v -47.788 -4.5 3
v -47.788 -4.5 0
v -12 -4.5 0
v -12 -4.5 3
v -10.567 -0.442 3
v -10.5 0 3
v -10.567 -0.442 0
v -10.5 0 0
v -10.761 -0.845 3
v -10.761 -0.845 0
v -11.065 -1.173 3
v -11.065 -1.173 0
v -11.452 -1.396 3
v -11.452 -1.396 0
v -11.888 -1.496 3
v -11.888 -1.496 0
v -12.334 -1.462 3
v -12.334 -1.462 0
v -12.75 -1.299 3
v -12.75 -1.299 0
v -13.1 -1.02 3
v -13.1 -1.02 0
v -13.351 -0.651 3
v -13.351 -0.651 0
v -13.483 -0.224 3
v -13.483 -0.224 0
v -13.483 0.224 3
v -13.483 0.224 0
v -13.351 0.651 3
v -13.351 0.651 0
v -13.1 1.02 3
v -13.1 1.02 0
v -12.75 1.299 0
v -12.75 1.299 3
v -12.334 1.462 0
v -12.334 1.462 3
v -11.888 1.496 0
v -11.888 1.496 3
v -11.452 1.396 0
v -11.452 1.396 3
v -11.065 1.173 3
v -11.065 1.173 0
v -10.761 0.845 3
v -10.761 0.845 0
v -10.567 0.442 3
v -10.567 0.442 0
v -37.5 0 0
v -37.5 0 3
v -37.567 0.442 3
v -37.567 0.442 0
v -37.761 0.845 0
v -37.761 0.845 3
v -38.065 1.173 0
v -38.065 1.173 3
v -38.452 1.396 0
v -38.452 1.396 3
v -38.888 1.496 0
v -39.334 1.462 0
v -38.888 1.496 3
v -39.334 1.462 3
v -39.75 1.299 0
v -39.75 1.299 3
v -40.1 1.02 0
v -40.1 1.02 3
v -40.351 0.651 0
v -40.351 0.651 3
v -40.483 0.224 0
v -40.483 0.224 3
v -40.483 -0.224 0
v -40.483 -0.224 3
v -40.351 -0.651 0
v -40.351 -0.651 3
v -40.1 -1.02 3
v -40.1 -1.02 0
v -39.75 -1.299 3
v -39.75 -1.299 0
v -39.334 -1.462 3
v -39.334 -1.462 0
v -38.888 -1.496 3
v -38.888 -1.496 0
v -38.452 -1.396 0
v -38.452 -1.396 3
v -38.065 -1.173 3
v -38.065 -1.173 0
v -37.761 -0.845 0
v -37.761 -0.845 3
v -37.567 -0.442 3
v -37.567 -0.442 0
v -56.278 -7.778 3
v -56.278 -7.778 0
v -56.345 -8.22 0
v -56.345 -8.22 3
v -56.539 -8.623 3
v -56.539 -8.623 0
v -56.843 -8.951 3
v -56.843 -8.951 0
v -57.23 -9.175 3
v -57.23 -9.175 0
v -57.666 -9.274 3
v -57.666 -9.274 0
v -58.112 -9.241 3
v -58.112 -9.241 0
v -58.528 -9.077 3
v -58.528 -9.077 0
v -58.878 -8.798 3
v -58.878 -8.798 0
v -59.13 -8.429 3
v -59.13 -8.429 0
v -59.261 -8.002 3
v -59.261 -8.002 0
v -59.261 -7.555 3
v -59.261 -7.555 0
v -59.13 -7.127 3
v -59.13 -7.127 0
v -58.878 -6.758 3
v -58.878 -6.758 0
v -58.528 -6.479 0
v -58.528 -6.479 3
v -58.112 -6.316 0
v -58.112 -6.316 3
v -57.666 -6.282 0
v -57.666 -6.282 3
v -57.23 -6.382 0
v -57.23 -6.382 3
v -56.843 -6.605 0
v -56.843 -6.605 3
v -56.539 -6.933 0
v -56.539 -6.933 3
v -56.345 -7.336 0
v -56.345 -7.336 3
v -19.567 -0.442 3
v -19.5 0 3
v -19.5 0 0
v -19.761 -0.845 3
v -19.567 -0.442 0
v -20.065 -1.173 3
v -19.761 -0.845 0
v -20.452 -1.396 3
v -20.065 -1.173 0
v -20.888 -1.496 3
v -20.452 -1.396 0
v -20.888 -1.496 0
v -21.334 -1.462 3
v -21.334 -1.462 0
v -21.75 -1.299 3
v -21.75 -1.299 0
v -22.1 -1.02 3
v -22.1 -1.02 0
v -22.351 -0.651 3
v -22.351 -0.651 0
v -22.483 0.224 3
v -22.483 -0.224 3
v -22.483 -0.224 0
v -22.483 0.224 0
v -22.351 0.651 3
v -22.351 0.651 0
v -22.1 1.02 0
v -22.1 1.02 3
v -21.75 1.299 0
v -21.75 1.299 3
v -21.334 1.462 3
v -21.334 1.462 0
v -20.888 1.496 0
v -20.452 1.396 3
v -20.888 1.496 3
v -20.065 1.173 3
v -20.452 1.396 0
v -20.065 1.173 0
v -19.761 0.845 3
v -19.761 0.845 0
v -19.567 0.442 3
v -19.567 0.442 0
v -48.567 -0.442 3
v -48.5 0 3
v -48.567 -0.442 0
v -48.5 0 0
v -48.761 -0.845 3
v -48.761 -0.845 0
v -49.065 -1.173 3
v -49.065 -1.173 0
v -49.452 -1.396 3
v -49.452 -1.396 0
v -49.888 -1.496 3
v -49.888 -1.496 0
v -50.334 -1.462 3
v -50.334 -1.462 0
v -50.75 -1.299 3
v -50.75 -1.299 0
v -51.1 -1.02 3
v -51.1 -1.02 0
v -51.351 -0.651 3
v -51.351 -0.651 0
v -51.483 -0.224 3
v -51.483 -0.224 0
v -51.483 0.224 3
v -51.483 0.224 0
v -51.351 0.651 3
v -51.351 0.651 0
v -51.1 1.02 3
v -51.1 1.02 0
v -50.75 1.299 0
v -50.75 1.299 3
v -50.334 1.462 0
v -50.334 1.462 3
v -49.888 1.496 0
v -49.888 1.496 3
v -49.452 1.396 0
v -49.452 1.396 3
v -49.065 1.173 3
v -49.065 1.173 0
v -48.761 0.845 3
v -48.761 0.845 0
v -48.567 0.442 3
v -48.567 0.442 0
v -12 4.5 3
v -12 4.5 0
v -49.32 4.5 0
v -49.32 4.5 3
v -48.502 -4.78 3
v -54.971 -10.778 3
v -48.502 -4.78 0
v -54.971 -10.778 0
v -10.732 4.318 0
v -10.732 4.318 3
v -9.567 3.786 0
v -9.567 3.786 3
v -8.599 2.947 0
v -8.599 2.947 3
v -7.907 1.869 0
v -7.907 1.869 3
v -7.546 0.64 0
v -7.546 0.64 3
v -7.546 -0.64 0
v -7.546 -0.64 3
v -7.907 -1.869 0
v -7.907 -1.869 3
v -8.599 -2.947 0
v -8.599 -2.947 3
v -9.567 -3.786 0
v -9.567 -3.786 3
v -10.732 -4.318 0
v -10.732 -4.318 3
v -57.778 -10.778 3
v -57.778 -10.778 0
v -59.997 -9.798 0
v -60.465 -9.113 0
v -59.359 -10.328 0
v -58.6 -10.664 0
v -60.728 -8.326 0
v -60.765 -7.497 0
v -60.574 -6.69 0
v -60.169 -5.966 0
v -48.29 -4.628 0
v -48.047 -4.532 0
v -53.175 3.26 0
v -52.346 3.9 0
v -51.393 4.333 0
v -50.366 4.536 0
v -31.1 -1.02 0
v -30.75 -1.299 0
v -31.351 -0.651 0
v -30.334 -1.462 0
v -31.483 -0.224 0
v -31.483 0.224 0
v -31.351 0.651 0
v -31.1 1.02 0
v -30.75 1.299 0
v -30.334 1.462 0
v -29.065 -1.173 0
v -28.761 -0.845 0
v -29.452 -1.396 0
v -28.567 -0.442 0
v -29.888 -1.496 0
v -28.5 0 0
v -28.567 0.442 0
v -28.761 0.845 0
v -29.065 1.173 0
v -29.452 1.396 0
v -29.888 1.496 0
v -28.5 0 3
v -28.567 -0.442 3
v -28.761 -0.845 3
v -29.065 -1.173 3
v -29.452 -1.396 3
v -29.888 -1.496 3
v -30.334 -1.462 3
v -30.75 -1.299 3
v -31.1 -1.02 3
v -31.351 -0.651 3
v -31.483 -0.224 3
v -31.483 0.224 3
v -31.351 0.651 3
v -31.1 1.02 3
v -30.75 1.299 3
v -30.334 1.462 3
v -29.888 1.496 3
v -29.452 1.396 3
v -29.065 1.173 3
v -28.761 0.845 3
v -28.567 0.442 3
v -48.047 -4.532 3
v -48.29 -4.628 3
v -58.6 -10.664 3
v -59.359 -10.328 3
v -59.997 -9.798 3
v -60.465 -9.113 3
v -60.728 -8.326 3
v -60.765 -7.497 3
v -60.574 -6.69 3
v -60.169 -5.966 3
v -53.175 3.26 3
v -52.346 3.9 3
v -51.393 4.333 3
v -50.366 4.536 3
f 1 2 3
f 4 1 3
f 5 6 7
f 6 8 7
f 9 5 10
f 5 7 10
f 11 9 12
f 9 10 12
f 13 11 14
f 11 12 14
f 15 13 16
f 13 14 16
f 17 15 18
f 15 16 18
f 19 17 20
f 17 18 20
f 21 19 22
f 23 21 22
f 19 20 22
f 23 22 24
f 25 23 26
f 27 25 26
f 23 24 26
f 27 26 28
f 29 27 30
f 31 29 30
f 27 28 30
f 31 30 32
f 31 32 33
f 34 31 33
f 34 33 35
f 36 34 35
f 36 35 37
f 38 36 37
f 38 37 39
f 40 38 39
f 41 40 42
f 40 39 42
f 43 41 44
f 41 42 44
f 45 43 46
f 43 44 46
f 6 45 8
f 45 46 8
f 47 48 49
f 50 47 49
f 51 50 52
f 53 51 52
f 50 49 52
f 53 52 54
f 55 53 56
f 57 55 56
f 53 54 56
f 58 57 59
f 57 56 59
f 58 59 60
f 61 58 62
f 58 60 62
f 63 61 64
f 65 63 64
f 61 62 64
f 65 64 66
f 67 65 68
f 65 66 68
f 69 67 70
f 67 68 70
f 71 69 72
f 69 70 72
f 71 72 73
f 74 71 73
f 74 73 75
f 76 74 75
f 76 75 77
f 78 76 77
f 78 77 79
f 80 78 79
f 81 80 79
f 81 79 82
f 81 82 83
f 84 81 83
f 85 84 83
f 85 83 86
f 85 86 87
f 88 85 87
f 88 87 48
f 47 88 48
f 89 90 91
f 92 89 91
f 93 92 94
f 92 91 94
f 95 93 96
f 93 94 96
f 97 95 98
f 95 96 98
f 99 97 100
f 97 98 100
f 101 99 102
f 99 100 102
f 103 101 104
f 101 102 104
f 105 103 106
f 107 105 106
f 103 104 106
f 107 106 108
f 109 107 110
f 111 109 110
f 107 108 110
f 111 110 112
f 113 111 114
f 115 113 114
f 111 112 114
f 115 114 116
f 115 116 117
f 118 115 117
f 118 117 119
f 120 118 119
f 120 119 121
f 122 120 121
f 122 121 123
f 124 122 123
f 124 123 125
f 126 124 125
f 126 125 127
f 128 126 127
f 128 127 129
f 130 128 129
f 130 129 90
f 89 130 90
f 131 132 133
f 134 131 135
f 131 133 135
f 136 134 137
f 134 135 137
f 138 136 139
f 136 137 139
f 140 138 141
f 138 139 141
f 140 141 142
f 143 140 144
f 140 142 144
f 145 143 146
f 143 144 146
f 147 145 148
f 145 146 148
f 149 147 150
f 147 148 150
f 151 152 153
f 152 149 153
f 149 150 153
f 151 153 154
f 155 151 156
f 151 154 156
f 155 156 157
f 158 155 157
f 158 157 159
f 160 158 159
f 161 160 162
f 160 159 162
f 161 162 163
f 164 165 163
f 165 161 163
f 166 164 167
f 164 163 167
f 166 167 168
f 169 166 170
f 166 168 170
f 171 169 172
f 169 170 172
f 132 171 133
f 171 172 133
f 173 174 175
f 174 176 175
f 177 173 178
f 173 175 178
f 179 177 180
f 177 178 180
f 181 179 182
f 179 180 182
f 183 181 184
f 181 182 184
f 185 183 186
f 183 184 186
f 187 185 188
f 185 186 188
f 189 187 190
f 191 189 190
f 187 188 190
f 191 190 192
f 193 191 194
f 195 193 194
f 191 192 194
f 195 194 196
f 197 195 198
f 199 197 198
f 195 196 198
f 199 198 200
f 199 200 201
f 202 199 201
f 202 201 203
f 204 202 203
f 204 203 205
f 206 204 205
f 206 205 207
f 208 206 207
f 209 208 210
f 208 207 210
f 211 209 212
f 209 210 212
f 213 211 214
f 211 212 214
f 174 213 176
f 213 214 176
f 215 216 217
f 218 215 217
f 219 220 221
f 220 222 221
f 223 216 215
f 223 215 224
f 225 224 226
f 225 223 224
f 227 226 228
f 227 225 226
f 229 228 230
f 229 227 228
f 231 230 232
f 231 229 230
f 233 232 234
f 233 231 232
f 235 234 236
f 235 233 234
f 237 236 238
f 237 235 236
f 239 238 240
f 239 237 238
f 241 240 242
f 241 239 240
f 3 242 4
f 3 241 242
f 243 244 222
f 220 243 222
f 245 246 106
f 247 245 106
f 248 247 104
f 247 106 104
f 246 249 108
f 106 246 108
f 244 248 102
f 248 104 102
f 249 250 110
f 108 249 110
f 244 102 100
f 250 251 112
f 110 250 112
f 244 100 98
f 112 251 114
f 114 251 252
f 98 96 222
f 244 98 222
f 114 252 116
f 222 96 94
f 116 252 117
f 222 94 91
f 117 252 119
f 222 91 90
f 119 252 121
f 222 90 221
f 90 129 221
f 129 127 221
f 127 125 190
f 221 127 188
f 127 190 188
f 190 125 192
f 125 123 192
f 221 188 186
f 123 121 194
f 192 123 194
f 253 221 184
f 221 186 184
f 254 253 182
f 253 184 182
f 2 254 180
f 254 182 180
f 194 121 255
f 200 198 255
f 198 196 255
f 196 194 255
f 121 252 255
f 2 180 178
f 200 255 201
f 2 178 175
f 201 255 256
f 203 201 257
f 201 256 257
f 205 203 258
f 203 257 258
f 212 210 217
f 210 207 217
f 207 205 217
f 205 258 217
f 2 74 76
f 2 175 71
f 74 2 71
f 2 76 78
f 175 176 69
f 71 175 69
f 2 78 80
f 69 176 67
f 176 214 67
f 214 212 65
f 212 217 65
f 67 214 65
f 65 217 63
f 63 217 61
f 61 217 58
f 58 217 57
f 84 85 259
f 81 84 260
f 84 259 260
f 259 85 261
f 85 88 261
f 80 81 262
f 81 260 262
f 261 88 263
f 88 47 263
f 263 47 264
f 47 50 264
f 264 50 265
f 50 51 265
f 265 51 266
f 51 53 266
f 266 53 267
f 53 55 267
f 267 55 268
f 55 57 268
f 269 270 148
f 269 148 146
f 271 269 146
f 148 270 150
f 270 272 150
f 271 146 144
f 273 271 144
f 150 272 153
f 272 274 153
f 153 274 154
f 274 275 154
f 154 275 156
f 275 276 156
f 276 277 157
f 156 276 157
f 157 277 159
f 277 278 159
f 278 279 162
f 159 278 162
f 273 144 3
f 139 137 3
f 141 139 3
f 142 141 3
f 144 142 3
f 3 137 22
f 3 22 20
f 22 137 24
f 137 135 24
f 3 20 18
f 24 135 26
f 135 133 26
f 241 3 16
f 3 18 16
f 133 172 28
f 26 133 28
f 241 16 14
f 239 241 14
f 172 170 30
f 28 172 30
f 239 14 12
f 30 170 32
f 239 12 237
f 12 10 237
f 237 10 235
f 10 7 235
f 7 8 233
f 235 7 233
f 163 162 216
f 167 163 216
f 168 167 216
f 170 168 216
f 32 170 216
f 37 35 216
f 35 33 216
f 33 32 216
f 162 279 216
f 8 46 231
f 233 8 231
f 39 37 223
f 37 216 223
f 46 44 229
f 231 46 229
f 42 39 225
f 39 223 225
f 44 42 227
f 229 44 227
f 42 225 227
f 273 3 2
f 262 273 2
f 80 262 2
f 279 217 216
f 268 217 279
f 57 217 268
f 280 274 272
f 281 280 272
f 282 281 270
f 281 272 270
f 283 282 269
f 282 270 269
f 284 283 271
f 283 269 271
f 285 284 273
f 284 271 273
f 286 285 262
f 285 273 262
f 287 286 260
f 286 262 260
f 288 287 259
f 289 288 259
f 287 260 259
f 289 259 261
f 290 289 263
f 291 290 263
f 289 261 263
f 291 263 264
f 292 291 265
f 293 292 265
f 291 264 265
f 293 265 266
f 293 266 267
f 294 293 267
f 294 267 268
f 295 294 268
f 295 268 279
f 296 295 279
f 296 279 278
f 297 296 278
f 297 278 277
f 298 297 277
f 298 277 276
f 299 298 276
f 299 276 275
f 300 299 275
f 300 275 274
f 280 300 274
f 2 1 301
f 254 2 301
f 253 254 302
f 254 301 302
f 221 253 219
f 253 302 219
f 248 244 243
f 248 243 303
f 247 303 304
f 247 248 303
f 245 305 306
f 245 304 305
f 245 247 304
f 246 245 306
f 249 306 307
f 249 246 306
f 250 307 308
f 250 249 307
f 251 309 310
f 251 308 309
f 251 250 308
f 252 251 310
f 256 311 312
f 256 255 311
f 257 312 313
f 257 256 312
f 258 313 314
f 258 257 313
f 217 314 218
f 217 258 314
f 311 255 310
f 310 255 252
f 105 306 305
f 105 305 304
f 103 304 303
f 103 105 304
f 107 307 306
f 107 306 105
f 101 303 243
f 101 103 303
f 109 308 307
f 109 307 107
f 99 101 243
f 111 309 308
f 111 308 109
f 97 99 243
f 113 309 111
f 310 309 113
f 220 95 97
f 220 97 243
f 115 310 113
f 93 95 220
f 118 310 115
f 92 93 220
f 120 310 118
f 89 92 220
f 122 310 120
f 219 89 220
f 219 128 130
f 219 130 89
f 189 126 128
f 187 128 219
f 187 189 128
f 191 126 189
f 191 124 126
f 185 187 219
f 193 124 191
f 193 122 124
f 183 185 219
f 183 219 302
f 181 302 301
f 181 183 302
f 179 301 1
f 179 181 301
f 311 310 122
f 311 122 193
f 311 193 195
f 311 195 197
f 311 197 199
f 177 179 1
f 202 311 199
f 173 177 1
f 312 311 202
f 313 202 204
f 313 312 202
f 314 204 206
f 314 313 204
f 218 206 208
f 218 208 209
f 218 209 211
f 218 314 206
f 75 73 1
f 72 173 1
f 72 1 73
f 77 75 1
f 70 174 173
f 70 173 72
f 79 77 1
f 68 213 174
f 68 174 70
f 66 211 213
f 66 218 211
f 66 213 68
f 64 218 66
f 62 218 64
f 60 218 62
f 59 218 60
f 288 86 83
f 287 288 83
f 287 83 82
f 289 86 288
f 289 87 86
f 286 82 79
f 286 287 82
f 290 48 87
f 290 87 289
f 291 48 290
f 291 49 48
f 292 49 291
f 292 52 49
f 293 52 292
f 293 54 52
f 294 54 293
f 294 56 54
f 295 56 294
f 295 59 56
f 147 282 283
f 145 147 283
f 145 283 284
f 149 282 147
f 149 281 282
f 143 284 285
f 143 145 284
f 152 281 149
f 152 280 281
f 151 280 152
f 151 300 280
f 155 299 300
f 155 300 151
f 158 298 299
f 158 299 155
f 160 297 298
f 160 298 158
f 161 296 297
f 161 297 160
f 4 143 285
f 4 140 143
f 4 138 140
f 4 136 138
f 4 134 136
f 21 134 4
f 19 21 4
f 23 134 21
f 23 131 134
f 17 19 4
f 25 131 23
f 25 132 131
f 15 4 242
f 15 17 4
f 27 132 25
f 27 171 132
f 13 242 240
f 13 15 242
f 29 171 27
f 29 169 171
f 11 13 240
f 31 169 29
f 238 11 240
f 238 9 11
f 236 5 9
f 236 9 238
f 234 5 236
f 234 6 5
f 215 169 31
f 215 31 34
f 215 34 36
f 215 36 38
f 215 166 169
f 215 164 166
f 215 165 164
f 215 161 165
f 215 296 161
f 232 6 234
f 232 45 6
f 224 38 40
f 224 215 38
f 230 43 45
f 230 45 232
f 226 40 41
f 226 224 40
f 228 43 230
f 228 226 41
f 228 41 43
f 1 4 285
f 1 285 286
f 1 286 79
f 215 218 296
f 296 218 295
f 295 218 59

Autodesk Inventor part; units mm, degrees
ref_plane "YZ Plane" through (0, 0, 0) normal (1, 0, 0) x (0, 1, 0)
ref_plane "XZ Plane" through (0, 0, 0) normal (0, 1, 0) x (-1, 0, 0)
ref_plane "XY Plane" through (0, 0, 0) normal (0, 0, 1) x (1, 0, 0)
sketch "スケッチ1" plane through (0, 0, 0) normal (0, 0, 1) x (1, 0, 0)
  circle A0 centre (-55, 0) radius 8.025 construction
  circle A1 centre (0, 0) radius 1.25 construction
  arc A2 (-44.5788, 6) -> (-63.6661, 8.3366) centre (-55, 0) ccw construction
  line L0 (-63.6661, 8.3366) -> (-109.1623, -38.9576) construction
  line L1 (-102.7709, -46.5745) -> (-48.2949, -9.9821) construction
  arc A3 (-48.2949, -9.9821) -> (-44.5788, -6) centre (-55, 0) ccw construction
  line L2 (-44.5788, -6) -> (-5.2915, -6) construction
  arc A4 (-5.2915, -6) -> (-5.2915, 6) centre (0, 0) ccw construction
  line L3 (-5.2915, 6) -> (-44.5788, 6) construction
  circle A5 centre (0, 0) radius 1.5
  circle A6 centre (-30, 0) radius 1.5
  circle A7 centre (-12, 0) radius 1.5
  circle A8 centre (-21, 0) radius 1.5
  line L4 (-30, 0) -> (0, 0)
  line L5 (-30, 0) -> (-50, 0)
  line L6 (-50, 0) -> (-30, 0)
  circle A9 centre (-50, 0) radius 1.5
  circle A10 centre (-50, 0) radius 4.025 construction
  circle A11 centre (-50, 0) radius 7.125 construction
  circle A12 centre (-57.7782, -7.7782) radius 1.5
  circle A13 centre (-57.7782, -7.7782) radius 3 construction
  line L7 (-50, 0) -> (-57.7782, -7.7782) construction
  line L8 (-53.1753, 3.2604) -> (-60.169, -5.9659)
  line L9 (-55.3874, -9.5904) -> (-46.209, 2.5181)
  arc A14 (-46.209, 2.5181) -> (-53.1753, 3.2604) centre (-50, 0) ccw
  arc A15 (-60.169, -5.9659) -> (-55.3874, -9.5904) centre (-57.7782, -7.7782) ccw
  line L10 (-50, 0) -> (0, 0) construction
  line L11 (-50, -4.5) -> (0, -4.5)
  line L12 (0, 4.5) -> (-50, 4.5)
  arc A16 (-50, 4.5) -> (-50, -4.5) centre (-50, 0) ccw
  arc A17 (0, -4.5) -> (0, 4.5) centre (0, 0) ccw
  line L13 (-57.7782, -10.7782) -> (-54.9706, -10.7782)
  line L14 (-54.9706, -10.7782) -> (-48.1997, -4.5)
  line L15 (-50, 0) -> (-57.7782, -7.7782)
  circle A18 centre (-12, 0) radius 4.5
  point P0 (-53.8891, -3.8891)
  point P1 (-25, 0)
  point P2 (-48.7574, -3)
  point P3 (-49.3198, 4.5)
  point P4 (-53.5862, 2.7184)
  point P5 (-51.3675, -4.2872)
  point P6 (-12, -4.5)
  point P7 (-12, 4.5)
  dimension "d25" = 3
  dimension "d26" = 0
  dimension "d0" = 20
  dimension "d2" = 3
  dimension "d3" = 8.05
  dimension "d4" = 3.1
  dimension "d5" = 30
  dimension "d6" = 3
  dimension "d7" = 3
  dimension "d8" = 3
  dimension "d9" = 3
  dimension "d11" = 9
  dimension "d13" = 3
  dimension "d14" = 6
  dimension "d15" = 6
  dimension "d16" = 9
  dimension "d21" = 135
  dimension "d22" = 10
  dimension "d30" = 9
  dimension "d31" = 11
extrude "押し出し1" add sketch "スケッチ1" along normal blind 3 contours L4 A8 A18 L11 A16 L9 L5 A6 | A6 L5 L9 A14 L12 A18 L4 A8 | L9 A9 L5 | L5 A9 L15 A16 L12 A14 L9 | L9 A16 L15 A9 | A18 L4 A7 | L4 A7 A18 | A16 L11 L14 L13 A15 L9 | L9 A15 L8 A16 | L12 A16 L8 A14
fillet "フィレット1" radius 1.05 1 edges at (-48.1997, -4.5, 1.5)
sketch "スケッチ2" plane through (0, 0, 3) normal (0, 0, 1) x (1, 0, 0)
  arc A0 (-60.7927, -6.5251) -> (-59.7797, -5.8711) centre (-60.7525, -5.4759) ccw
  arc A1 (-55.3849, -4.4725) -> (-59.7797, -5.8711) centre (-57.0004, -7.0004) ccw
  arc A2 (-55.3849, -4.4725) -> (-43.7567, 3.1657) centre (-50, 0) ccw
  arc A3 (-44.0452, 4.6286) -> (-43.7567, 3.1657) centre (-43.1001, 4.055) ccw
  line L0 (-44.0452, 4.6286) -> (-41.5381, 8.9709)
  arc A4 (-41.5381, 8.9709) -> (-46.5567, 11.6351) centre (-44, 10.3923) ccw
  line L1 (-46.5567, 11.6351) -> (-49.0637, 7.2927)
  arc A5 (-50.5985, 6.9744) -> (-49.0637, 7.2927) centre (-49.9731, 7.8177) ccw
  arc A6 (-50.5985, 6.9744) -> (-50.2678, 6.9949) centre (-50, 0) ccw
  circle A7 centre (-50, 0) radius 4.025
  circle A8 centre (-50, 0) radius 1.5 projected
  circle A9 centre (-39, 0) radius 4
  line L2 (-50, 0) -> (-38.3804, 0)
  circle A10 centre (-39, 0) radius 1.5
  circle A11 centre (-30, 0) radius 1.5 projected
  point P0 (0, 0)
  point P1 (-43.3711, 2.3255)
  point P2 (-43, 0)
  point P3 (-49.3534, 6.9701)
  point P4 (-44.1966, 3.9141)
  point P5 (-43.7567, 3.1657)
  dimension "d23" = 12
  dimension "d24" = 8
  dimension "d27" = 3
  dimension "d28" = 9
  dimension "d29" = 7
extrude "押し出し2" cut sketch "スケッチ2" against normal blind 3 contours A10
properties part number "中間節アーム先端締結パーツ内" material "アルミニウム 7075"
